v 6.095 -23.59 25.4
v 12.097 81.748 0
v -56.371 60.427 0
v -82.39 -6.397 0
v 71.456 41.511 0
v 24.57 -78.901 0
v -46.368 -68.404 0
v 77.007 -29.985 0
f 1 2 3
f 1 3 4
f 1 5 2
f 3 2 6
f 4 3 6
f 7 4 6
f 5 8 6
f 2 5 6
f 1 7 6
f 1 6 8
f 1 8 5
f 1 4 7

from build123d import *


with BuildPart() as f3:
    # F0 (on Top) → F3 section 0
    with BuildSketch(Plane.XY, mode=Mode.PRIVATE) as f3_s0:
        Polygon((12.097289, 81.748076), (-56.370683, 60.427133), (-82.390381, -6.396673), (-46.368442, -68.403654), (24.56988, -78.901288), (77.006581, -29.984643), (71.455756, 41.51105), align=None)
    loft([Vertex(6.095344, -23.590403, 25.4), f3_s0.sketch])


solid = f3.part
